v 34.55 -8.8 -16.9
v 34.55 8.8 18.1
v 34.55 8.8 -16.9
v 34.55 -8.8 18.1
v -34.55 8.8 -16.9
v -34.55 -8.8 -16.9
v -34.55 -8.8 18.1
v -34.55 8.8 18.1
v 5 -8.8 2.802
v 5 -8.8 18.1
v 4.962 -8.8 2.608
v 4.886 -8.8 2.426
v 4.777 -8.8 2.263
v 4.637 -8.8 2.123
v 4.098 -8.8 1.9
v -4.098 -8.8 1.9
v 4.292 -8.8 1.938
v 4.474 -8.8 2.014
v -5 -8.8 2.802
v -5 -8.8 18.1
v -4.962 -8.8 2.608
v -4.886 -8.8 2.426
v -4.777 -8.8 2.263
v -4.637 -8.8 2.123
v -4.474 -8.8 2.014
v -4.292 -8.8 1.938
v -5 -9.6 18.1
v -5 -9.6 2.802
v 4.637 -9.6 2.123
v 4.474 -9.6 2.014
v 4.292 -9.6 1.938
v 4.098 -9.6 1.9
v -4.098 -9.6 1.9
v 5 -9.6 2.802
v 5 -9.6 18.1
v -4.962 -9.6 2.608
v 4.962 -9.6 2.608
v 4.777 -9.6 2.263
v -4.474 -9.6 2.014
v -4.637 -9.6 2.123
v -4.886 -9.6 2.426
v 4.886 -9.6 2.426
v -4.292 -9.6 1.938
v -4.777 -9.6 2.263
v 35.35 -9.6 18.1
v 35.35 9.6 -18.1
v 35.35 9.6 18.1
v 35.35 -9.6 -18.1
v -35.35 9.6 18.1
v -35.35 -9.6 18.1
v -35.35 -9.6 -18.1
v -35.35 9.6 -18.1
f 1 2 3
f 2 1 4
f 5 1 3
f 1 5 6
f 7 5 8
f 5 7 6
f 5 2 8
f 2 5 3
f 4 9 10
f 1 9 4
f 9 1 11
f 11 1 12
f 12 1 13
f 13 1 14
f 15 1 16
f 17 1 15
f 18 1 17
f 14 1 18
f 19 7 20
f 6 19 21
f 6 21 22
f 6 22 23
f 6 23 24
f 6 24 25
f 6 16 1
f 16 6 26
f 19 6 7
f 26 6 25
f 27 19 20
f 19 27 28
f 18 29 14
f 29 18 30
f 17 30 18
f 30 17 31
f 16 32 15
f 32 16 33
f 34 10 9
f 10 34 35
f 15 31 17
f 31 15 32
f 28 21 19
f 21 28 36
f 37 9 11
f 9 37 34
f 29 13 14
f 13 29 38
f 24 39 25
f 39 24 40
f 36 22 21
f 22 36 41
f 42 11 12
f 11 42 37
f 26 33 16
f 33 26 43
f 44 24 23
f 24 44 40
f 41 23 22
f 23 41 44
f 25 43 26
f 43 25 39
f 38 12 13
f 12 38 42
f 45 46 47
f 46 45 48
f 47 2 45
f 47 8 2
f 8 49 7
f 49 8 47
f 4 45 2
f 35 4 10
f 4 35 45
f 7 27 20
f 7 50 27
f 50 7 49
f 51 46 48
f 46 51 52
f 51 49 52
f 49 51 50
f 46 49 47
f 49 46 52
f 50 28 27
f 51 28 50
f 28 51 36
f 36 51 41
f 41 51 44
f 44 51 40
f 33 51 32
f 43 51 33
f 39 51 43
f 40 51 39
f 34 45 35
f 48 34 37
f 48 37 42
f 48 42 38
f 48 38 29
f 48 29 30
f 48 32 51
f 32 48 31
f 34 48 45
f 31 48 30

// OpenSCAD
// file: ../lib/util.scad
left   = -1;
right  = 1;
front  = -1;
rear   = 1;
top    = 1;
bottom = -1;

x = 0;
y = 1;
z = 2;

width  = x;
depth  = y;
height = z;

function accurate_diam(diam,sides) = 1 / cos(180/sides) / 2 * diam;

module hole(diam,len,sides=8) {
  rotate([0,0,180/sides]) {
    cylinder(r=accurate_diam(diam,sides),h=len,center=true,$fn=sides);
  }
}

module accurate_circle(diam,sides=8) {
  rotate([0,0,180/sides]) {
    circle(r=accurate_diam(diam,sides),center=true,$fn=sides);
  }
}

module debug_axes() {
  color("red") {
    translate([50,0,0]) cube([100,.2,.2],center=true);
    translate([0,50,0]) cube([.2,100,.2],center=true);
    translate([0,0,50]) cube([.2,.2,100],center=true);
  }
}
// main file
include <../lib/util.scad>;

resolution = 32;

module camera_cover() {
  extrusion_width   = 0.4;
  extrusion_height  = 0.3;
  wall_thickness    = extrusion_width*2;
  floor_thickness   = extrusion_height*4;
  camera_width      = 68.5;
  camera_depth      = 17;
  camera_height     = 35;
  cable_from_bottom = 20;
  cable_hole_width  = 10;
  rounded_diam      = 2;

  allowance    = 0.3;
  cavity_depth = camera_depth+allowance*2;
  cavity_width = camera_width+allowance*2;
  overall_height = camera_height+floor_thickness;

  body_diam = cavity_depth+wall_thickness*2;

  module shaped(added=0) {
    cube([cavity_width+added*2,cavity_depth+added*2,overall_height],center=true);
  }

  module body() {
    shaped(wall_thickness);
  }

  module holes() {
    translate([0,0,floor_thickness]) {
      shaped();
    }

    translate([0,-body_diam/2,-overall_height/2]) {
      hull() {
        translate([0,0,overall_height]) {
          cube([cable_hole_width,wall_thickness*4,2],center=true);
        }
        for(x=[left,right]) {
          translate([x*(cable_hole_width-rounded_diam)/2,0,cable_from_bottom+rounded_diam/2]) {
            rotate([90,0,0]) {
              hole(rounded_diam,wall_thickness*4,resolution);
            }
          }
        }
      }
    }
  }

  difference() {
    body();
    holes();
  }
}

camera_cover();
